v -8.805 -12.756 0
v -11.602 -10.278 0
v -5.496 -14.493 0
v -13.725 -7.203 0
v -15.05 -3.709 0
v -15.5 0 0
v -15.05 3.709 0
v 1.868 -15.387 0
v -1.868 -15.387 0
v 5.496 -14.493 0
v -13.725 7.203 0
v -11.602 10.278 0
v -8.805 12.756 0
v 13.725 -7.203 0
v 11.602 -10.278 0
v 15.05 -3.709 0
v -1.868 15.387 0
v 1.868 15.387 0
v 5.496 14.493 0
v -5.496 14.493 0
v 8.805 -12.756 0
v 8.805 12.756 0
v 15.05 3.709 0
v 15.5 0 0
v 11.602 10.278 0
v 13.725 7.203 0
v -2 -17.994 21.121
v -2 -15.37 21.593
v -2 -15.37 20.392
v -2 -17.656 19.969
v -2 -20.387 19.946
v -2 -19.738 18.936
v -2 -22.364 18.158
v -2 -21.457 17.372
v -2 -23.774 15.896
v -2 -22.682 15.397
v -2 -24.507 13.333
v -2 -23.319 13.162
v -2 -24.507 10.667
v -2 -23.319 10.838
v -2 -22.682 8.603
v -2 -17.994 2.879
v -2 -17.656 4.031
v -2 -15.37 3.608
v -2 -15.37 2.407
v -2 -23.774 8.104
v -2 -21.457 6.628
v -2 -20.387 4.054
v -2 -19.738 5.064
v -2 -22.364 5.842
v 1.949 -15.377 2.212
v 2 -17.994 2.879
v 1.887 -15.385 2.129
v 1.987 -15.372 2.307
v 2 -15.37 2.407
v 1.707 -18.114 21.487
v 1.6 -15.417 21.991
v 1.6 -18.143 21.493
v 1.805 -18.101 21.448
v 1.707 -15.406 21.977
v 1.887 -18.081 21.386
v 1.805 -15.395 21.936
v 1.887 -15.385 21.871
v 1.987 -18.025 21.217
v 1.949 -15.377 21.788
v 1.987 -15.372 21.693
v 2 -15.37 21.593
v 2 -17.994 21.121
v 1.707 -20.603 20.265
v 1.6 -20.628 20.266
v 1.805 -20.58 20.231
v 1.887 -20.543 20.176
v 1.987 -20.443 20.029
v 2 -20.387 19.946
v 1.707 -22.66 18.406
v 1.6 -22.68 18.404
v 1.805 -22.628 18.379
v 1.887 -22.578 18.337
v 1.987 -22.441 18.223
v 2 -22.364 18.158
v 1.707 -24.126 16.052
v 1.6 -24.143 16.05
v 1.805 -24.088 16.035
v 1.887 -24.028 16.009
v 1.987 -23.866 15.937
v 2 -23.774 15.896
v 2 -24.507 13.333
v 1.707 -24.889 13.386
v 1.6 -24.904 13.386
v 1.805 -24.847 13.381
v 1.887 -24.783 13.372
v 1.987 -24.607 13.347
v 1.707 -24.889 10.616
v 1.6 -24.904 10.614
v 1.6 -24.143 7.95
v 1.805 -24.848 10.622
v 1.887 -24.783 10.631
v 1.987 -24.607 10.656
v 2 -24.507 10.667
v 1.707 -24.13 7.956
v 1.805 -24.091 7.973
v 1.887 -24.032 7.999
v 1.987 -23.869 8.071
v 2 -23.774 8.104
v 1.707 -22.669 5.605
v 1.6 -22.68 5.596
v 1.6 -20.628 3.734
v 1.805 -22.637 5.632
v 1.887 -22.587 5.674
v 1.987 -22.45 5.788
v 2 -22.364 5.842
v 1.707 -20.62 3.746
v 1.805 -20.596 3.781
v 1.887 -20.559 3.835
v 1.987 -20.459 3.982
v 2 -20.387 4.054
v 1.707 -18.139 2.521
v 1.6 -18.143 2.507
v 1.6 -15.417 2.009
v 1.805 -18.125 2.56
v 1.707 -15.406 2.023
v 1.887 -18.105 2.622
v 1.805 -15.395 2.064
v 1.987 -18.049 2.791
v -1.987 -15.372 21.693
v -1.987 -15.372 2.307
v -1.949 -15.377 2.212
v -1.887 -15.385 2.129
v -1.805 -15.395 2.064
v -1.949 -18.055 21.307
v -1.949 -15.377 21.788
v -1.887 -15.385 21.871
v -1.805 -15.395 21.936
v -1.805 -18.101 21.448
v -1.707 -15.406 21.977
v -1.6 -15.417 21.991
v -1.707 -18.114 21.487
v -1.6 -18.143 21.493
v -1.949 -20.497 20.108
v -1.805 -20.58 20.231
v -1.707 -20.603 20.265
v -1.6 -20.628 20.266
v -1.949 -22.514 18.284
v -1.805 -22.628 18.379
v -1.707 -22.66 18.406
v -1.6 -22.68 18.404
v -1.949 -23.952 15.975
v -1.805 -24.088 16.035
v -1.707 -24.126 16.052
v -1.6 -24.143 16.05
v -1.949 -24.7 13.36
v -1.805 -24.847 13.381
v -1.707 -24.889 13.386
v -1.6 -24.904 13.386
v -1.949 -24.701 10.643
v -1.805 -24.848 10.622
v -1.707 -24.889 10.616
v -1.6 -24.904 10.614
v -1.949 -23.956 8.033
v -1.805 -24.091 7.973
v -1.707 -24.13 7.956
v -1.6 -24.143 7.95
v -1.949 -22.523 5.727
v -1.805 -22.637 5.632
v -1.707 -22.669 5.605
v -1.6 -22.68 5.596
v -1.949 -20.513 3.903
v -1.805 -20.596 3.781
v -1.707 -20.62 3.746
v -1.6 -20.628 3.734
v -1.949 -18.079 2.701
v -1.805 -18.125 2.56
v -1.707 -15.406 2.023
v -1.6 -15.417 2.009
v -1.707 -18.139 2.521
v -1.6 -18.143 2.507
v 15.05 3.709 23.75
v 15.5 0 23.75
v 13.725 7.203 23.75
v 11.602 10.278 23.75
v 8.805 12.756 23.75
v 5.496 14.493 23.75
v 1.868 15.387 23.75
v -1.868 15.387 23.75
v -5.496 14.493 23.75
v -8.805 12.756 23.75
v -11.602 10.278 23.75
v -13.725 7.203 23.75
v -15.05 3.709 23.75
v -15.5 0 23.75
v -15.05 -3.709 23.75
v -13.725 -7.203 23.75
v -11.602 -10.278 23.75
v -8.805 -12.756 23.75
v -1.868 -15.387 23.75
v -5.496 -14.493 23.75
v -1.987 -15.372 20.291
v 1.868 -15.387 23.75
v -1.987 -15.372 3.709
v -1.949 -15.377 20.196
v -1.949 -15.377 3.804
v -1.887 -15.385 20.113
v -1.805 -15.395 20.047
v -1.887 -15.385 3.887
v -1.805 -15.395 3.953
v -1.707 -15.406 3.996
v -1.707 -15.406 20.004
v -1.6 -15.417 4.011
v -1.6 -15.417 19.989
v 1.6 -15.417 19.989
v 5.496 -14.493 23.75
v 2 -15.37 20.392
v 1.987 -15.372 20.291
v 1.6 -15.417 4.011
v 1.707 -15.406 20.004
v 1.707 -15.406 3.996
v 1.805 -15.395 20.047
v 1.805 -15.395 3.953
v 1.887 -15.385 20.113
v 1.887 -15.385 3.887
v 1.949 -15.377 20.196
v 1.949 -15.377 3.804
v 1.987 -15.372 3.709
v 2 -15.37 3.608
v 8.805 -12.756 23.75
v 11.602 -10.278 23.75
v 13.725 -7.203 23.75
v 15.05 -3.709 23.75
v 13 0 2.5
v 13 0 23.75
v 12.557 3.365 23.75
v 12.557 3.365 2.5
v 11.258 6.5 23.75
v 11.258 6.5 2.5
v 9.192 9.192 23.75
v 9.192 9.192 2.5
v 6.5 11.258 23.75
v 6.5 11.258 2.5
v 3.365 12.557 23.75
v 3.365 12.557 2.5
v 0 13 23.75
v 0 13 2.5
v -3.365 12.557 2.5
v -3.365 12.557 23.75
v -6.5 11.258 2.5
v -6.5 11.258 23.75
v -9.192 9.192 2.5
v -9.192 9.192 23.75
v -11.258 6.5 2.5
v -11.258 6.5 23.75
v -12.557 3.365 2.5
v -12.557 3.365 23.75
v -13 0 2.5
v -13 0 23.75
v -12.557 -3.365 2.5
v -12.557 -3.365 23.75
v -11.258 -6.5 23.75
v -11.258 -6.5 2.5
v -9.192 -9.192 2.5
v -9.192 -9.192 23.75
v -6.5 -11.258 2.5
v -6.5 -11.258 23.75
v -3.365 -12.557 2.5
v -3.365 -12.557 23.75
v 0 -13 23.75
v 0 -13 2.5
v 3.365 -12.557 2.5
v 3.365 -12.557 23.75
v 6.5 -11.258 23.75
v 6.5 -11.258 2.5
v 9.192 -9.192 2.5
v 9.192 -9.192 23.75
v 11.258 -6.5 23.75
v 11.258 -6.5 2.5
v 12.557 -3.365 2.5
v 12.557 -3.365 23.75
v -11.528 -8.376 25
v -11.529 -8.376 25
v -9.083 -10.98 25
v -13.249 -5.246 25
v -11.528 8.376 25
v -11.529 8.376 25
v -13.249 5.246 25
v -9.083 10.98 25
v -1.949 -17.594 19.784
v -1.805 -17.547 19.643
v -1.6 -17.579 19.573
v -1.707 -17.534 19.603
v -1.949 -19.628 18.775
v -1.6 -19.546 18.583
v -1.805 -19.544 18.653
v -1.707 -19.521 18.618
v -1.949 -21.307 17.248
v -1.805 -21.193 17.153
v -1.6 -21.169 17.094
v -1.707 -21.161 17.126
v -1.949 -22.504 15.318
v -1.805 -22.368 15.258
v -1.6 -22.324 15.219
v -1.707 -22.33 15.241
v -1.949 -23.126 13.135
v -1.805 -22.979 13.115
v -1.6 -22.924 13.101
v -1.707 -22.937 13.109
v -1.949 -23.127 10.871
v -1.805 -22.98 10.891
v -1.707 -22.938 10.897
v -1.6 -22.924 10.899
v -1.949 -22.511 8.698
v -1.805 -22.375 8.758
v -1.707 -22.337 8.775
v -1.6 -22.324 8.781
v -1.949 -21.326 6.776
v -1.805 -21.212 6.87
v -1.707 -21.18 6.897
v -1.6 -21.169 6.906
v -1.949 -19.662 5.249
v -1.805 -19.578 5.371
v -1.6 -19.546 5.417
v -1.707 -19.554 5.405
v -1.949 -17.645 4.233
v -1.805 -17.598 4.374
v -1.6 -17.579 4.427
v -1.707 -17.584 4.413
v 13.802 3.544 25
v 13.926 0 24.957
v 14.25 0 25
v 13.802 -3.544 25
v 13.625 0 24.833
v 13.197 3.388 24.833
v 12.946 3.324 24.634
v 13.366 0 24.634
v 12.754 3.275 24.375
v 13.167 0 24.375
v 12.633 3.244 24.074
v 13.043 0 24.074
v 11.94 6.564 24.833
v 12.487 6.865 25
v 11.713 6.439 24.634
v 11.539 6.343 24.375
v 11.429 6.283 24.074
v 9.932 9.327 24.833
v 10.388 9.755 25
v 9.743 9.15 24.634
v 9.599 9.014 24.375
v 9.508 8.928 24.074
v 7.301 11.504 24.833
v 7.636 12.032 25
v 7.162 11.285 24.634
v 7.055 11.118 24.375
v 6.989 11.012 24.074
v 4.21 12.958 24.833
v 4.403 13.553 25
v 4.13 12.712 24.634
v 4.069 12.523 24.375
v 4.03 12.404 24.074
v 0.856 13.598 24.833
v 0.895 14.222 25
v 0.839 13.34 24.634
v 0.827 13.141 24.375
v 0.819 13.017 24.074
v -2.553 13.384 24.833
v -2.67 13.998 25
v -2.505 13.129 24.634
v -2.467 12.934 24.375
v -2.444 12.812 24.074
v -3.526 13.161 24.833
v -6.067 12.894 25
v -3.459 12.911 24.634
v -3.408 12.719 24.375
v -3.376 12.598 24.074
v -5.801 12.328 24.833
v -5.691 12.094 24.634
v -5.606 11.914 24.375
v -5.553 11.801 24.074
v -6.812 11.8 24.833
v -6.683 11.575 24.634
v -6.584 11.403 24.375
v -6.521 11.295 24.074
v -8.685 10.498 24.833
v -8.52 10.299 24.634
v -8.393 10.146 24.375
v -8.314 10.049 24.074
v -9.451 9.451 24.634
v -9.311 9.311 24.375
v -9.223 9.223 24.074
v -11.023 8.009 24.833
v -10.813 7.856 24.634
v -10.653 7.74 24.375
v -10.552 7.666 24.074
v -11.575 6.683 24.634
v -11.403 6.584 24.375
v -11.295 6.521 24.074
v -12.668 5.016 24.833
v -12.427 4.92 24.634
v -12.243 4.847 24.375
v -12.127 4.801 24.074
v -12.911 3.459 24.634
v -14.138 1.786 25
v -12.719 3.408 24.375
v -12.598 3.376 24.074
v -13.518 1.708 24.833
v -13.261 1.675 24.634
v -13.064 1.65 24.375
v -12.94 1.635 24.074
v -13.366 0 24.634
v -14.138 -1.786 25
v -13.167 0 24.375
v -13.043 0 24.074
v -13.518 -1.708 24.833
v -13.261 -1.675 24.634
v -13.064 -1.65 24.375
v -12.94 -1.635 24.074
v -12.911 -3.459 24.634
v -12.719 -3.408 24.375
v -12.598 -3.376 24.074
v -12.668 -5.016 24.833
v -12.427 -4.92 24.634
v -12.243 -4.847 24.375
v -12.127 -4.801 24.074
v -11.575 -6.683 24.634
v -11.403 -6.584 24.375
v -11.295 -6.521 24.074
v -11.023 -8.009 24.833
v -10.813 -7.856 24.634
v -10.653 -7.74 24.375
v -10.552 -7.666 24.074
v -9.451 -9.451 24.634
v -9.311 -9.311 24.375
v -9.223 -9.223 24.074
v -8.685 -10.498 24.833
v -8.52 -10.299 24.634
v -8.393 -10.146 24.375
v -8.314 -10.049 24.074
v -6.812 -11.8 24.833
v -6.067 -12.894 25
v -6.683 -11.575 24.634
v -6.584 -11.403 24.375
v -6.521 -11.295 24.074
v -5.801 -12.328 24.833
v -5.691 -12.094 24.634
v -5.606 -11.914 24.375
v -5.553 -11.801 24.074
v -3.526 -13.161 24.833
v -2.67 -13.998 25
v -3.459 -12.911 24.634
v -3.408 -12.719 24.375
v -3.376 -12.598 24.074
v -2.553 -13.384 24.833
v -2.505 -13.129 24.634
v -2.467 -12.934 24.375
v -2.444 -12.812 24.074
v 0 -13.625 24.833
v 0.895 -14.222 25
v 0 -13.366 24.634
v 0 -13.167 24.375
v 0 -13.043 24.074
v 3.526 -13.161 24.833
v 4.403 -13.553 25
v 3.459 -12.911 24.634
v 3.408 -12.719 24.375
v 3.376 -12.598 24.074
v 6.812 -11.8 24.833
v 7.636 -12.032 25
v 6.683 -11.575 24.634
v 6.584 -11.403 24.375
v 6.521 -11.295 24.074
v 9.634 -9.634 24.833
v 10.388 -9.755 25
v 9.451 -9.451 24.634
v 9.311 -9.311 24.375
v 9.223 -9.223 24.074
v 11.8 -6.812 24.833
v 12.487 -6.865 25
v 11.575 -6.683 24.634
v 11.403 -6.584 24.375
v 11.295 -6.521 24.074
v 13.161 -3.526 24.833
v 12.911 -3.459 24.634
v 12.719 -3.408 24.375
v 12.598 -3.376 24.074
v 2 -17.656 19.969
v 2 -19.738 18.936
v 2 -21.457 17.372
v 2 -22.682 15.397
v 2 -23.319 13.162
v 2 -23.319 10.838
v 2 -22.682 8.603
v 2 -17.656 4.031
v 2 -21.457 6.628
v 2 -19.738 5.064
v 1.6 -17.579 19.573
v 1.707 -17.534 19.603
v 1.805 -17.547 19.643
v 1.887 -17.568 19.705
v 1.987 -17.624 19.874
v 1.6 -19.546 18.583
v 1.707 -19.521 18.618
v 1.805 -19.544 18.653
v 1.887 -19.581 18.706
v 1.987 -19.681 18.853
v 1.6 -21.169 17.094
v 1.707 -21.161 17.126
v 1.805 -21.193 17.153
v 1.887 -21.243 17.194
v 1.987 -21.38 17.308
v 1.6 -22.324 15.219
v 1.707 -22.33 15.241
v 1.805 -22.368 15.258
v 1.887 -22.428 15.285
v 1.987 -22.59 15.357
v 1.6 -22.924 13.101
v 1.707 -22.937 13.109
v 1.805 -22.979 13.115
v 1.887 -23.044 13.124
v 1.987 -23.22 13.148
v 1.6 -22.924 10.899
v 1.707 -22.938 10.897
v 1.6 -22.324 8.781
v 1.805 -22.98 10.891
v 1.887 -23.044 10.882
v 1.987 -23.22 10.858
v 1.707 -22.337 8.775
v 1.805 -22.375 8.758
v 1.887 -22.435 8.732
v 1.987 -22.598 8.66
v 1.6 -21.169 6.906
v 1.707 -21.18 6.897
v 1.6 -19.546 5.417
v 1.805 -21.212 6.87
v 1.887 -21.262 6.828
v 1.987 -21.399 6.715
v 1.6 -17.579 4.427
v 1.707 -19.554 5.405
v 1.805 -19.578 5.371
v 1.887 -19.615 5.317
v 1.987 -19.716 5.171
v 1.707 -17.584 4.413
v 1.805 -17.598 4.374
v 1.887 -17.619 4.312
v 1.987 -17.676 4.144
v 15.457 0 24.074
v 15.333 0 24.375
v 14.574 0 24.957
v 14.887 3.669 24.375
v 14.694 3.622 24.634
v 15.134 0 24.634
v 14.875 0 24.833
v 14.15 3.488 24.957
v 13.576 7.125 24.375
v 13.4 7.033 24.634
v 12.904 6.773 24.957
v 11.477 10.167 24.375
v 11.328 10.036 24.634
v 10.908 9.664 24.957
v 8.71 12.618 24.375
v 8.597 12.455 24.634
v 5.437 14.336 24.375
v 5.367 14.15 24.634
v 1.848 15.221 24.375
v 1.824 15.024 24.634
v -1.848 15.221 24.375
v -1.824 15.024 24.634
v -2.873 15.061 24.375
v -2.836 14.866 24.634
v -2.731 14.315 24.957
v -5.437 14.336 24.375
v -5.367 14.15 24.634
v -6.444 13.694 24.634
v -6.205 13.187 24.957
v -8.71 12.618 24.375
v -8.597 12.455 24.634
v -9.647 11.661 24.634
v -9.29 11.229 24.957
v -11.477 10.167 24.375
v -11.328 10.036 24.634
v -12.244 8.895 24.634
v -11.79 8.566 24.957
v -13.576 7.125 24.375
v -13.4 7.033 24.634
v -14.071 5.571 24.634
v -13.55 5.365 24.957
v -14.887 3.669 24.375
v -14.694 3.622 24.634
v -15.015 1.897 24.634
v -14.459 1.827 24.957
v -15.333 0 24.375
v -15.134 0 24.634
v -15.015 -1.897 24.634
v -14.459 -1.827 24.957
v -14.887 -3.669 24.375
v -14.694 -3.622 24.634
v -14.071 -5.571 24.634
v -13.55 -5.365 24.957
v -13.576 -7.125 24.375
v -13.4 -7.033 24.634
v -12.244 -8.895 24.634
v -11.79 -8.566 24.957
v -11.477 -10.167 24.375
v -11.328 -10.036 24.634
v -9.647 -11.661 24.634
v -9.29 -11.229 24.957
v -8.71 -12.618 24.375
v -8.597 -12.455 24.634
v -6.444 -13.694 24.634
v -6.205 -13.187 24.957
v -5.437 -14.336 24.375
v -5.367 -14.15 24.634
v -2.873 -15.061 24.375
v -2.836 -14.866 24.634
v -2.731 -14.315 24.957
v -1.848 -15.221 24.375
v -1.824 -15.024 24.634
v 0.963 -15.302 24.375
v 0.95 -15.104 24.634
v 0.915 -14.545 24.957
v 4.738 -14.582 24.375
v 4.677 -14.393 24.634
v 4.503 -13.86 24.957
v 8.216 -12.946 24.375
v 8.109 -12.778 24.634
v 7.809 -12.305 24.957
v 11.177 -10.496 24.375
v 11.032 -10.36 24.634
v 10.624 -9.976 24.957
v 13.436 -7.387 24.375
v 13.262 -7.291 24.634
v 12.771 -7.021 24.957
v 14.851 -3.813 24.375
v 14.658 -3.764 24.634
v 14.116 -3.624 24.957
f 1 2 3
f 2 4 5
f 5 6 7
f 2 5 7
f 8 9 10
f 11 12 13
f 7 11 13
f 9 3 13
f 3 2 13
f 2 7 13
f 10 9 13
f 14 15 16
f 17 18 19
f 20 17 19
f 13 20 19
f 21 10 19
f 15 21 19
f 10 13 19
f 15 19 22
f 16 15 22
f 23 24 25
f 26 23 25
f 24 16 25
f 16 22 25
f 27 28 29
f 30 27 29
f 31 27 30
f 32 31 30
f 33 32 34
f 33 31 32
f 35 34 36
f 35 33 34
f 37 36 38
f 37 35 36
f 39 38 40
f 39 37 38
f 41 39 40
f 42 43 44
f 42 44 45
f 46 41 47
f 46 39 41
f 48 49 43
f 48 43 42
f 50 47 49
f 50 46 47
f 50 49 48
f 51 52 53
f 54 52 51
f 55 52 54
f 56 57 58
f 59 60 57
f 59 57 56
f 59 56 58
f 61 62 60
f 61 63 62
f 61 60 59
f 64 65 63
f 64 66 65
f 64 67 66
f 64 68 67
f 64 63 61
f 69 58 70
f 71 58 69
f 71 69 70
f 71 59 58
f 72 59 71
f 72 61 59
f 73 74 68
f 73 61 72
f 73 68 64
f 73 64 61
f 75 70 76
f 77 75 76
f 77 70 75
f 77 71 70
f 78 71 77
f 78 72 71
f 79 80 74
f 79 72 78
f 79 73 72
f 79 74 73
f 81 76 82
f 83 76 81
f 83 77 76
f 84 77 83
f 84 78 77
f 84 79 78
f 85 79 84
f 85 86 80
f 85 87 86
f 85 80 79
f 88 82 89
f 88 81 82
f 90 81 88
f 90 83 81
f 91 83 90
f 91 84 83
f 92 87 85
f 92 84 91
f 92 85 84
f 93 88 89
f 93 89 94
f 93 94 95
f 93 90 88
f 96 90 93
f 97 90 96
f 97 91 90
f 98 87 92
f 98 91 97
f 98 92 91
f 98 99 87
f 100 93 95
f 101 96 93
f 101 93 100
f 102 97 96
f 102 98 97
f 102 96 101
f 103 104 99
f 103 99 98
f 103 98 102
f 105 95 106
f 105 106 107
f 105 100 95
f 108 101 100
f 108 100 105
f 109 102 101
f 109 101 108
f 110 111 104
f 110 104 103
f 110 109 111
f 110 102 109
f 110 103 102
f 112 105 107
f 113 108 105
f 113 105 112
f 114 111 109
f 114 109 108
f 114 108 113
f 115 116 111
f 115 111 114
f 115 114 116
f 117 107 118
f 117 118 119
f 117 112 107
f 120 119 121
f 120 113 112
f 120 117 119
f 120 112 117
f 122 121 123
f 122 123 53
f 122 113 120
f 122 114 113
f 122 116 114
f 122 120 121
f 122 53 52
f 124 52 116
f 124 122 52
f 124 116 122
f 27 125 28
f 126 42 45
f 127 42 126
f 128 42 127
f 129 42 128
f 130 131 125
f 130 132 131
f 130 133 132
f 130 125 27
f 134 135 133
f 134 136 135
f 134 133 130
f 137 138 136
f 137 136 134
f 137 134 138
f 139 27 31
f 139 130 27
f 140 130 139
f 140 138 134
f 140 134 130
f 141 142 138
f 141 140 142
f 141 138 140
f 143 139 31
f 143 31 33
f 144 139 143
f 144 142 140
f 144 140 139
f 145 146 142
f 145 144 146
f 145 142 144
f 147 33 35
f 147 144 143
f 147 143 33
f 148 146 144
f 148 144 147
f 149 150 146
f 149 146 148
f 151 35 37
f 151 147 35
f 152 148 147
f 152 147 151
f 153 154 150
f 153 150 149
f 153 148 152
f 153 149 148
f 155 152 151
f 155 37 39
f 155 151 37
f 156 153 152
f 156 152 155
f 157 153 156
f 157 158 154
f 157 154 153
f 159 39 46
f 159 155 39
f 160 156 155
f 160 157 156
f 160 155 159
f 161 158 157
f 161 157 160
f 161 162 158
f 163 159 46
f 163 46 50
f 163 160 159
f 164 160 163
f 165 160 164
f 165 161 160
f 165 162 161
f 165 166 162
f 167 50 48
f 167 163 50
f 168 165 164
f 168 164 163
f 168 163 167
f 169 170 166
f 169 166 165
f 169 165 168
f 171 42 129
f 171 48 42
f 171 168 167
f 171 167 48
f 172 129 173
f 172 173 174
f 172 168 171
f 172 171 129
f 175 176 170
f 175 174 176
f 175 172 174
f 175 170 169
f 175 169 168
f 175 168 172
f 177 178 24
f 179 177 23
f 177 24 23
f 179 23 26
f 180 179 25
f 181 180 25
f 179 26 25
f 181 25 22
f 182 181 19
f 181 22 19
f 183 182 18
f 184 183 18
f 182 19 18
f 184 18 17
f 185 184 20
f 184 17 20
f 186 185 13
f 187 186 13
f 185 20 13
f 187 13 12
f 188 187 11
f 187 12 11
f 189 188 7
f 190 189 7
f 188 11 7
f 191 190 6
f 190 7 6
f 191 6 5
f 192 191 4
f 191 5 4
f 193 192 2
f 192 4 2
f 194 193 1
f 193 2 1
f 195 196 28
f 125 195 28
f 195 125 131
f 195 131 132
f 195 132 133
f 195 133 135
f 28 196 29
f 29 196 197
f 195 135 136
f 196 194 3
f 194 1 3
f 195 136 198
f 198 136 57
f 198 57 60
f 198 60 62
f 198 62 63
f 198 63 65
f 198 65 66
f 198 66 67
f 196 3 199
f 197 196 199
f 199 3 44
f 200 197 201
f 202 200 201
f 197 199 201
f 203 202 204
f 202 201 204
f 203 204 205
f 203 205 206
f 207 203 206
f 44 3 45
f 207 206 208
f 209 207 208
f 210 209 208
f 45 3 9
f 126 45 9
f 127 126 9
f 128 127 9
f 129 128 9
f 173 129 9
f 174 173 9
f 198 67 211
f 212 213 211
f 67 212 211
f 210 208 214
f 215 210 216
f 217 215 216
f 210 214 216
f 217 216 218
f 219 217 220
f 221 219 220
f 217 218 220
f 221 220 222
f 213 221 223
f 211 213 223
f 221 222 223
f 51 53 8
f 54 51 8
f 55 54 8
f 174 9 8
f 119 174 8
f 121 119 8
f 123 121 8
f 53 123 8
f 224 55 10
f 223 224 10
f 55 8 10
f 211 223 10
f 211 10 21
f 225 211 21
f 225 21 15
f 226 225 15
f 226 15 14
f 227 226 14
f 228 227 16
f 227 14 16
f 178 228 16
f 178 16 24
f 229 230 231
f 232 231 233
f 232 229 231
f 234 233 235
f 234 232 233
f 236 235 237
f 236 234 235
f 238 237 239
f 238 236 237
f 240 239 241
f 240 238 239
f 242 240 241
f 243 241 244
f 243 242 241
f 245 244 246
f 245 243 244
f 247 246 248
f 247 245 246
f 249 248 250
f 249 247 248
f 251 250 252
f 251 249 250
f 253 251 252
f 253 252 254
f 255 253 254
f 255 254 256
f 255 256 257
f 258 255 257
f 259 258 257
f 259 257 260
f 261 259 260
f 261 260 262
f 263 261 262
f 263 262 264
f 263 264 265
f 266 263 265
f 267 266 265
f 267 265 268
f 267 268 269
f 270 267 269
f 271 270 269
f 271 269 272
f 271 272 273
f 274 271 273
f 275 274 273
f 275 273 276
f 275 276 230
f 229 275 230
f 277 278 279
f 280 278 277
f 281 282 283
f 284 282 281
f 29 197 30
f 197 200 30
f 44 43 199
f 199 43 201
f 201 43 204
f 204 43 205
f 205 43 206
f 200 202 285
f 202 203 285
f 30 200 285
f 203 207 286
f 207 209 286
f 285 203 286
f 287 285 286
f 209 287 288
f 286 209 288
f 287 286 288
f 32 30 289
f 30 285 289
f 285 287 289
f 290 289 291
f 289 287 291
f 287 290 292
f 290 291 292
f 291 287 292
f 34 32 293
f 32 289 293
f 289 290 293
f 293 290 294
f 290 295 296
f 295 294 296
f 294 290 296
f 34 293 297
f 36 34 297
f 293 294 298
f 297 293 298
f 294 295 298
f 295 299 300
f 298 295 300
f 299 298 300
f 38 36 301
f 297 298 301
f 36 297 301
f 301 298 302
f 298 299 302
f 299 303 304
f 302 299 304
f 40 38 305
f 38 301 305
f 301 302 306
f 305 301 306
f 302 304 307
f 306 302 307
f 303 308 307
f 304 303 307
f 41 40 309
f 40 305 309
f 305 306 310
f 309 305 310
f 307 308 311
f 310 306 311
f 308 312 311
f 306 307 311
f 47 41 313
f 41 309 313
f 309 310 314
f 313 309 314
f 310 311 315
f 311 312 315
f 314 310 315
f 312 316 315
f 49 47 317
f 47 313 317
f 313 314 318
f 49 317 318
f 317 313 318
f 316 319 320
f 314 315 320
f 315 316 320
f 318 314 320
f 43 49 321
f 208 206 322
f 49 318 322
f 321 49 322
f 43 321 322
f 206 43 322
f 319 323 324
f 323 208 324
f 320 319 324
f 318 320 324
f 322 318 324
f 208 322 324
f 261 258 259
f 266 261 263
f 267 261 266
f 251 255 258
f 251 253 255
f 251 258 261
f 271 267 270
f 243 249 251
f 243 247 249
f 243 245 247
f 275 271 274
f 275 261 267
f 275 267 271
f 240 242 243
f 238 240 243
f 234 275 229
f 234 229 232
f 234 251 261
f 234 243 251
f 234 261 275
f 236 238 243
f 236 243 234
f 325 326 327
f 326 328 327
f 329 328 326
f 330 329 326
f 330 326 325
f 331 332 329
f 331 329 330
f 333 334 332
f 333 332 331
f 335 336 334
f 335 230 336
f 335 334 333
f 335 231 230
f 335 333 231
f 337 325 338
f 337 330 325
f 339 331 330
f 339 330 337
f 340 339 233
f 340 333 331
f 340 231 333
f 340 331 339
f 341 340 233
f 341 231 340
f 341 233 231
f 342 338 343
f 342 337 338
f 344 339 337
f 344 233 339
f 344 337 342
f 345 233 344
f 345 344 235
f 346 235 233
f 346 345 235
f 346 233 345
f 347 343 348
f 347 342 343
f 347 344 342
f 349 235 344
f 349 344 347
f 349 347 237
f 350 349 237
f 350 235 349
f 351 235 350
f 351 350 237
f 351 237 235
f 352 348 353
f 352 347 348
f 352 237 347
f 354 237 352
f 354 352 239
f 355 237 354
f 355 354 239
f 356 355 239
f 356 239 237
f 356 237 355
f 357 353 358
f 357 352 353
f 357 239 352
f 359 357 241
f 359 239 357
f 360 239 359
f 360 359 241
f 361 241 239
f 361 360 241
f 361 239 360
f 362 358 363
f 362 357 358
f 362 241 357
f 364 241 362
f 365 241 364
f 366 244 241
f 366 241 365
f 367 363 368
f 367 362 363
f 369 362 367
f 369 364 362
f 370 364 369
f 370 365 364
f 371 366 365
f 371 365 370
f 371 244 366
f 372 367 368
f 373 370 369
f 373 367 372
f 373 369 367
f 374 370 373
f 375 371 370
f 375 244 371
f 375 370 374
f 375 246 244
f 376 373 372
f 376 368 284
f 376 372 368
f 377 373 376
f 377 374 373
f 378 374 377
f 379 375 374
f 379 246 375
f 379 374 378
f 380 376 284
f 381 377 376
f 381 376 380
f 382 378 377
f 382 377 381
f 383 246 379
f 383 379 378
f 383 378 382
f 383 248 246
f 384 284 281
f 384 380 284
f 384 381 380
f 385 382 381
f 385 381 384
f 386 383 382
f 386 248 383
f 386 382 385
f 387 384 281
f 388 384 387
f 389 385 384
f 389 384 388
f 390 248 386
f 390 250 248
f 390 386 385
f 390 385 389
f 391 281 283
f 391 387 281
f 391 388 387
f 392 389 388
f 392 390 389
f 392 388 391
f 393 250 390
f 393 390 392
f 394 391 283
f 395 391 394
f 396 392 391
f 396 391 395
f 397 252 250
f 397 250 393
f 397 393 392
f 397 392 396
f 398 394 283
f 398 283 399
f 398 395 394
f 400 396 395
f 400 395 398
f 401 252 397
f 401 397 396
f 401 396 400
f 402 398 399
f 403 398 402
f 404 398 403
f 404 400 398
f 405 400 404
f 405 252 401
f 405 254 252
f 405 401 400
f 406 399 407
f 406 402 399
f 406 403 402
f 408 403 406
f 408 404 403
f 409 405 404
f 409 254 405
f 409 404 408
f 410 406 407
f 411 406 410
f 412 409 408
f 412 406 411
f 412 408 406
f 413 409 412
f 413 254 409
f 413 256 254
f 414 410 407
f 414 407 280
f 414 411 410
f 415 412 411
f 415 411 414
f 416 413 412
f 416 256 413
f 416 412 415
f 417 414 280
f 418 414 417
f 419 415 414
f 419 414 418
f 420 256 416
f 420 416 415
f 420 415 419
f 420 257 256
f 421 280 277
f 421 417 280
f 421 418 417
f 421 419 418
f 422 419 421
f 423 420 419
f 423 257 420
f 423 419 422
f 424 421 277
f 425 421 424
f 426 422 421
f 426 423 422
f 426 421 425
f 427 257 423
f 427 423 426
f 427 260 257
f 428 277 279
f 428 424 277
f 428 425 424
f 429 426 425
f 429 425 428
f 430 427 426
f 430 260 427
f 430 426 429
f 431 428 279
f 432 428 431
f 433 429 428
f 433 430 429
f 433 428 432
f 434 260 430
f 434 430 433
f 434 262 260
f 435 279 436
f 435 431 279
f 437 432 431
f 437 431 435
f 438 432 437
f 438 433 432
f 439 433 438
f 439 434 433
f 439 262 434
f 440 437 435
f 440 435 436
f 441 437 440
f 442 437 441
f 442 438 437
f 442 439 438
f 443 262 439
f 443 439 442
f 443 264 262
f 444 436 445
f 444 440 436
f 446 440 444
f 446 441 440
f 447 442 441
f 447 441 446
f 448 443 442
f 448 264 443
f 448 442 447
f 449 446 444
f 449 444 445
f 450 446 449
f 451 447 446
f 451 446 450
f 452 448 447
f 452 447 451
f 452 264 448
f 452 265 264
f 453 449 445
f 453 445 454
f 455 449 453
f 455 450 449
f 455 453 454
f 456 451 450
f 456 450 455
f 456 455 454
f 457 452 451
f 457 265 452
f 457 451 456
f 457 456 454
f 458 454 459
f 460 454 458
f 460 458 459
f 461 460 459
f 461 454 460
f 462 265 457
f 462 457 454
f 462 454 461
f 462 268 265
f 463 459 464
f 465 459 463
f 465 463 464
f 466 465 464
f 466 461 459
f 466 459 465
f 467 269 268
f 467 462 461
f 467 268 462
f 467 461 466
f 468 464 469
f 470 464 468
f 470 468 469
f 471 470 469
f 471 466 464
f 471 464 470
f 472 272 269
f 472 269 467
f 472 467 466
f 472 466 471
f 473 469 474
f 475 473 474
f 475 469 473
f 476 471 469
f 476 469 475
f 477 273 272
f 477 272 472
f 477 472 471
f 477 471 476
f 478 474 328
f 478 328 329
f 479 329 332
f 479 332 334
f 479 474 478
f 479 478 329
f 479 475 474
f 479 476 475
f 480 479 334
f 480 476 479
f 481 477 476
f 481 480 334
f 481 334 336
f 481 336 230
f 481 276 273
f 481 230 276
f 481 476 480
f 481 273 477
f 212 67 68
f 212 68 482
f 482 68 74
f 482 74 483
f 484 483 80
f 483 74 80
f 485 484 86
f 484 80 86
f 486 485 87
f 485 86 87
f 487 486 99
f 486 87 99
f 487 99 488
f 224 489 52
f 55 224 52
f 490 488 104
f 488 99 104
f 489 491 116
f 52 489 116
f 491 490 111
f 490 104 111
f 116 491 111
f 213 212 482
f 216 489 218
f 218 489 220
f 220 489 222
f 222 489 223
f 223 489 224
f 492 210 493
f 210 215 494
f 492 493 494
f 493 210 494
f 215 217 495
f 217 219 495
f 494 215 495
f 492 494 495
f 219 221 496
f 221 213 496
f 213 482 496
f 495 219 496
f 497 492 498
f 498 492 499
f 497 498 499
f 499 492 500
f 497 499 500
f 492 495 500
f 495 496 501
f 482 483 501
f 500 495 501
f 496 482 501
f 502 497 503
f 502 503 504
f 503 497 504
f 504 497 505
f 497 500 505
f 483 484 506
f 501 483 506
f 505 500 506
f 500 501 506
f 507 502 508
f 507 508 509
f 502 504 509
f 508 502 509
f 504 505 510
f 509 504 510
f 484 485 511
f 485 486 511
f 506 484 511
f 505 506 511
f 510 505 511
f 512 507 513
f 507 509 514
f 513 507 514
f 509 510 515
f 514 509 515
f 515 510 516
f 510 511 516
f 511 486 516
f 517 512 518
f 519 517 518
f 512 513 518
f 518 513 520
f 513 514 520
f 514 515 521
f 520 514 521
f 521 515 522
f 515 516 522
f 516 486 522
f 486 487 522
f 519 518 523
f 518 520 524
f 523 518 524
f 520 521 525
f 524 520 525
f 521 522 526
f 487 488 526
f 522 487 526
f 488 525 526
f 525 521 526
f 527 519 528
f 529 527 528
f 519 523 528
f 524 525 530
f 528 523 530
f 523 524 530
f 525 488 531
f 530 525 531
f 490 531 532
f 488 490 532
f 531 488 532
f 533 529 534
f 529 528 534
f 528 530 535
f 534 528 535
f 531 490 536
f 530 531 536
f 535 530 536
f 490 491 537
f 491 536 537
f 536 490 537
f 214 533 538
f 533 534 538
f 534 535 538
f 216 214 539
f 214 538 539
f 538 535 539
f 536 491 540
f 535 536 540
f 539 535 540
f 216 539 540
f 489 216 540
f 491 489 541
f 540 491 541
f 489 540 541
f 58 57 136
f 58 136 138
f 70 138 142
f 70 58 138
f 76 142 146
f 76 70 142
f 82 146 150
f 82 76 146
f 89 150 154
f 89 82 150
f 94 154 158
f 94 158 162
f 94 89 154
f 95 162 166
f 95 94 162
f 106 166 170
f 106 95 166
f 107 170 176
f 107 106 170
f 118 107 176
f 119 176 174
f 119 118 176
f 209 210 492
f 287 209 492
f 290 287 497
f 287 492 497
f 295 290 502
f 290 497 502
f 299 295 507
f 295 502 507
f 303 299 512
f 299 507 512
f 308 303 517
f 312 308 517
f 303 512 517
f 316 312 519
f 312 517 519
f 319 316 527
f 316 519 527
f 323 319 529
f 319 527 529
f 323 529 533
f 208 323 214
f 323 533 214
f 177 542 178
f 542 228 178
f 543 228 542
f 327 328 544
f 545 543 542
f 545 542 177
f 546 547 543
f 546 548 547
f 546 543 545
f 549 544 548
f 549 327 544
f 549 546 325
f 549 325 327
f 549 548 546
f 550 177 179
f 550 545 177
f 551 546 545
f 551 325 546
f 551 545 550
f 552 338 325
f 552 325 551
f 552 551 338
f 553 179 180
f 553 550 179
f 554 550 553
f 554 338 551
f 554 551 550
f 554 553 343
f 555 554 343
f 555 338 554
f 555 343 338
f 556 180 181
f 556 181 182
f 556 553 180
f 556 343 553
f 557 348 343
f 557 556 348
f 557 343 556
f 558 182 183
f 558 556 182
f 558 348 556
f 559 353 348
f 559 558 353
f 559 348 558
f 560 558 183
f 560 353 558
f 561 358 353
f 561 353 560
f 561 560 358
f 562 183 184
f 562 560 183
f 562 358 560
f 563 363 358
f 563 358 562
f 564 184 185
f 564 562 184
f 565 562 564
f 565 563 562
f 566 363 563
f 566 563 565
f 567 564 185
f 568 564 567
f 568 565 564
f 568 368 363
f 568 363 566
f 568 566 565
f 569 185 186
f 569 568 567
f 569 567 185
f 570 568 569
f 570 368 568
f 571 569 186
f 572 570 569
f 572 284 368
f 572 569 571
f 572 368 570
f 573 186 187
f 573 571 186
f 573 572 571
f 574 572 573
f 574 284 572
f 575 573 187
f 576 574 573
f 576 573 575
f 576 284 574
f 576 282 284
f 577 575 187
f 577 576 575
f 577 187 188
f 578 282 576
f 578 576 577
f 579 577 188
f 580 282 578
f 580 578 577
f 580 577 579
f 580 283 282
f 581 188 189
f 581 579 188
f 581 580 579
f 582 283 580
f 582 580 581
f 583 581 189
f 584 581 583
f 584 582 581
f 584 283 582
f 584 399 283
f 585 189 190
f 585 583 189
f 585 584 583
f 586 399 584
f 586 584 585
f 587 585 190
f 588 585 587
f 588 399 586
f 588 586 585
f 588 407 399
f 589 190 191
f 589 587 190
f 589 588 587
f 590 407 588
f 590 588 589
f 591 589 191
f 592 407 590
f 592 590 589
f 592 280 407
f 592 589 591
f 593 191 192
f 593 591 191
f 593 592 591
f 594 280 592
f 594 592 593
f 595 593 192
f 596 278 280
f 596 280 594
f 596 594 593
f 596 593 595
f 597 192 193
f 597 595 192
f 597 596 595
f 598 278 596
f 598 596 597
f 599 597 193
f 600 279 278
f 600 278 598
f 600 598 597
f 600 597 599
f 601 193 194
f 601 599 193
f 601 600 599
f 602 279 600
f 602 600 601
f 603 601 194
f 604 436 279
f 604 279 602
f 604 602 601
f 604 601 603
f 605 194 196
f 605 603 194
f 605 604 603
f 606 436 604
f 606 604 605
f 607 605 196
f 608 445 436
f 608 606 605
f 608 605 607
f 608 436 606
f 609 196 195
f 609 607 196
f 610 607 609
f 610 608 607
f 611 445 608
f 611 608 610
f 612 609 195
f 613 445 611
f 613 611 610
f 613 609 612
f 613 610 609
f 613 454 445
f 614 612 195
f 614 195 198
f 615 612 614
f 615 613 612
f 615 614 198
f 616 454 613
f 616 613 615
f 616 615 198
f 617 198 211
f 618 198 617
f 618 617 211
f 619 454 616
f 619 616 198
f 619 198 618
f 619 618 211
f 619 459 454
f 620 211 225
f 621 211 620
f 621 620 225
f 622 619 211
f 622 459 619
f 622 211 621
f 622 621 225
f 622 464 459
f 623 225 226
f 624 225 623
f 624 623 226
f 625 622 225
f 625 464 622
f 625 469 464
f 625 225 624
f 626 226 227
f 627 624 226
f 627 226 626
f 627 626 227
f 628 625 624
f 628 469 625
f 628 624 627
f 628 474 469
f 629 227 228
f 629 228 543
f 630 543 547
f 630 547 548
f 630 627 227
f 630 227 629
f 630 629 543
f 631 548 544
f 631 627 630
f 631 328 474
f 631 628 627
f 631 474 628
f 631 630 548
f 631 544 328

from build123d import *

# Parameters (mm, degrees)
F0_R     = 15.5
F1_DEPTH = 25
F2_T     = -2.5
F3_R     = 1.24999
F5_W     = 4
F5_H     = 2
F6_ANGLE = 180
F7_R     = 0.4


# Not quite as in the source:
# - a fillet or chamfer is up to 0.001 mm smaller than in the source, because OpenCascade refuses the exact size


with BuildPart() as f1:
    # F0 (on Top) → F1 (new body)
    with BuildSketch(Plane.XY):
        Circle(F0_R)
    extrude(amount=F1_DEPTH)

    # F2
    f2_openings = [f1.faces().sort_by_distance(p)[0] for p in [
        (0, 0, 25),
    ]]
    offset(amount=F2_T, openings=f2_openings)

    # F3 (radius 1.25 in the source; OpenCascade refuses exactly that, so slightly less here)
    f3_edges = [f1.edges().sort_by_distance(p)[0] for p in [
        (-15.5, 0, 25),
        (-13, 0, 25),
    ]]
    fillet(f3_edges, radius=F3_R)

    # F5 (on offset) → F6 (revolve)
    with BuildSketch(Plane.XZ.offset(15)):
        with Locations((0, 21)):
            Rectangle(F5_W, F5_H)
    revolve(axis=Axis((1, -15, 12), (1, 0, 0)), revolution_arc=F6_ANGLE)

    # F7
    f7_edges = [f1.edges().sort_by_distance(p)[0] for p in [
        (2, -25, 12),
        (-2, -25, 12),
        (2, -23, 12),
        (-2, -23, 12),
    ]]
    fillet(f7_edges, radius=F7_R)


solid = f1.part
